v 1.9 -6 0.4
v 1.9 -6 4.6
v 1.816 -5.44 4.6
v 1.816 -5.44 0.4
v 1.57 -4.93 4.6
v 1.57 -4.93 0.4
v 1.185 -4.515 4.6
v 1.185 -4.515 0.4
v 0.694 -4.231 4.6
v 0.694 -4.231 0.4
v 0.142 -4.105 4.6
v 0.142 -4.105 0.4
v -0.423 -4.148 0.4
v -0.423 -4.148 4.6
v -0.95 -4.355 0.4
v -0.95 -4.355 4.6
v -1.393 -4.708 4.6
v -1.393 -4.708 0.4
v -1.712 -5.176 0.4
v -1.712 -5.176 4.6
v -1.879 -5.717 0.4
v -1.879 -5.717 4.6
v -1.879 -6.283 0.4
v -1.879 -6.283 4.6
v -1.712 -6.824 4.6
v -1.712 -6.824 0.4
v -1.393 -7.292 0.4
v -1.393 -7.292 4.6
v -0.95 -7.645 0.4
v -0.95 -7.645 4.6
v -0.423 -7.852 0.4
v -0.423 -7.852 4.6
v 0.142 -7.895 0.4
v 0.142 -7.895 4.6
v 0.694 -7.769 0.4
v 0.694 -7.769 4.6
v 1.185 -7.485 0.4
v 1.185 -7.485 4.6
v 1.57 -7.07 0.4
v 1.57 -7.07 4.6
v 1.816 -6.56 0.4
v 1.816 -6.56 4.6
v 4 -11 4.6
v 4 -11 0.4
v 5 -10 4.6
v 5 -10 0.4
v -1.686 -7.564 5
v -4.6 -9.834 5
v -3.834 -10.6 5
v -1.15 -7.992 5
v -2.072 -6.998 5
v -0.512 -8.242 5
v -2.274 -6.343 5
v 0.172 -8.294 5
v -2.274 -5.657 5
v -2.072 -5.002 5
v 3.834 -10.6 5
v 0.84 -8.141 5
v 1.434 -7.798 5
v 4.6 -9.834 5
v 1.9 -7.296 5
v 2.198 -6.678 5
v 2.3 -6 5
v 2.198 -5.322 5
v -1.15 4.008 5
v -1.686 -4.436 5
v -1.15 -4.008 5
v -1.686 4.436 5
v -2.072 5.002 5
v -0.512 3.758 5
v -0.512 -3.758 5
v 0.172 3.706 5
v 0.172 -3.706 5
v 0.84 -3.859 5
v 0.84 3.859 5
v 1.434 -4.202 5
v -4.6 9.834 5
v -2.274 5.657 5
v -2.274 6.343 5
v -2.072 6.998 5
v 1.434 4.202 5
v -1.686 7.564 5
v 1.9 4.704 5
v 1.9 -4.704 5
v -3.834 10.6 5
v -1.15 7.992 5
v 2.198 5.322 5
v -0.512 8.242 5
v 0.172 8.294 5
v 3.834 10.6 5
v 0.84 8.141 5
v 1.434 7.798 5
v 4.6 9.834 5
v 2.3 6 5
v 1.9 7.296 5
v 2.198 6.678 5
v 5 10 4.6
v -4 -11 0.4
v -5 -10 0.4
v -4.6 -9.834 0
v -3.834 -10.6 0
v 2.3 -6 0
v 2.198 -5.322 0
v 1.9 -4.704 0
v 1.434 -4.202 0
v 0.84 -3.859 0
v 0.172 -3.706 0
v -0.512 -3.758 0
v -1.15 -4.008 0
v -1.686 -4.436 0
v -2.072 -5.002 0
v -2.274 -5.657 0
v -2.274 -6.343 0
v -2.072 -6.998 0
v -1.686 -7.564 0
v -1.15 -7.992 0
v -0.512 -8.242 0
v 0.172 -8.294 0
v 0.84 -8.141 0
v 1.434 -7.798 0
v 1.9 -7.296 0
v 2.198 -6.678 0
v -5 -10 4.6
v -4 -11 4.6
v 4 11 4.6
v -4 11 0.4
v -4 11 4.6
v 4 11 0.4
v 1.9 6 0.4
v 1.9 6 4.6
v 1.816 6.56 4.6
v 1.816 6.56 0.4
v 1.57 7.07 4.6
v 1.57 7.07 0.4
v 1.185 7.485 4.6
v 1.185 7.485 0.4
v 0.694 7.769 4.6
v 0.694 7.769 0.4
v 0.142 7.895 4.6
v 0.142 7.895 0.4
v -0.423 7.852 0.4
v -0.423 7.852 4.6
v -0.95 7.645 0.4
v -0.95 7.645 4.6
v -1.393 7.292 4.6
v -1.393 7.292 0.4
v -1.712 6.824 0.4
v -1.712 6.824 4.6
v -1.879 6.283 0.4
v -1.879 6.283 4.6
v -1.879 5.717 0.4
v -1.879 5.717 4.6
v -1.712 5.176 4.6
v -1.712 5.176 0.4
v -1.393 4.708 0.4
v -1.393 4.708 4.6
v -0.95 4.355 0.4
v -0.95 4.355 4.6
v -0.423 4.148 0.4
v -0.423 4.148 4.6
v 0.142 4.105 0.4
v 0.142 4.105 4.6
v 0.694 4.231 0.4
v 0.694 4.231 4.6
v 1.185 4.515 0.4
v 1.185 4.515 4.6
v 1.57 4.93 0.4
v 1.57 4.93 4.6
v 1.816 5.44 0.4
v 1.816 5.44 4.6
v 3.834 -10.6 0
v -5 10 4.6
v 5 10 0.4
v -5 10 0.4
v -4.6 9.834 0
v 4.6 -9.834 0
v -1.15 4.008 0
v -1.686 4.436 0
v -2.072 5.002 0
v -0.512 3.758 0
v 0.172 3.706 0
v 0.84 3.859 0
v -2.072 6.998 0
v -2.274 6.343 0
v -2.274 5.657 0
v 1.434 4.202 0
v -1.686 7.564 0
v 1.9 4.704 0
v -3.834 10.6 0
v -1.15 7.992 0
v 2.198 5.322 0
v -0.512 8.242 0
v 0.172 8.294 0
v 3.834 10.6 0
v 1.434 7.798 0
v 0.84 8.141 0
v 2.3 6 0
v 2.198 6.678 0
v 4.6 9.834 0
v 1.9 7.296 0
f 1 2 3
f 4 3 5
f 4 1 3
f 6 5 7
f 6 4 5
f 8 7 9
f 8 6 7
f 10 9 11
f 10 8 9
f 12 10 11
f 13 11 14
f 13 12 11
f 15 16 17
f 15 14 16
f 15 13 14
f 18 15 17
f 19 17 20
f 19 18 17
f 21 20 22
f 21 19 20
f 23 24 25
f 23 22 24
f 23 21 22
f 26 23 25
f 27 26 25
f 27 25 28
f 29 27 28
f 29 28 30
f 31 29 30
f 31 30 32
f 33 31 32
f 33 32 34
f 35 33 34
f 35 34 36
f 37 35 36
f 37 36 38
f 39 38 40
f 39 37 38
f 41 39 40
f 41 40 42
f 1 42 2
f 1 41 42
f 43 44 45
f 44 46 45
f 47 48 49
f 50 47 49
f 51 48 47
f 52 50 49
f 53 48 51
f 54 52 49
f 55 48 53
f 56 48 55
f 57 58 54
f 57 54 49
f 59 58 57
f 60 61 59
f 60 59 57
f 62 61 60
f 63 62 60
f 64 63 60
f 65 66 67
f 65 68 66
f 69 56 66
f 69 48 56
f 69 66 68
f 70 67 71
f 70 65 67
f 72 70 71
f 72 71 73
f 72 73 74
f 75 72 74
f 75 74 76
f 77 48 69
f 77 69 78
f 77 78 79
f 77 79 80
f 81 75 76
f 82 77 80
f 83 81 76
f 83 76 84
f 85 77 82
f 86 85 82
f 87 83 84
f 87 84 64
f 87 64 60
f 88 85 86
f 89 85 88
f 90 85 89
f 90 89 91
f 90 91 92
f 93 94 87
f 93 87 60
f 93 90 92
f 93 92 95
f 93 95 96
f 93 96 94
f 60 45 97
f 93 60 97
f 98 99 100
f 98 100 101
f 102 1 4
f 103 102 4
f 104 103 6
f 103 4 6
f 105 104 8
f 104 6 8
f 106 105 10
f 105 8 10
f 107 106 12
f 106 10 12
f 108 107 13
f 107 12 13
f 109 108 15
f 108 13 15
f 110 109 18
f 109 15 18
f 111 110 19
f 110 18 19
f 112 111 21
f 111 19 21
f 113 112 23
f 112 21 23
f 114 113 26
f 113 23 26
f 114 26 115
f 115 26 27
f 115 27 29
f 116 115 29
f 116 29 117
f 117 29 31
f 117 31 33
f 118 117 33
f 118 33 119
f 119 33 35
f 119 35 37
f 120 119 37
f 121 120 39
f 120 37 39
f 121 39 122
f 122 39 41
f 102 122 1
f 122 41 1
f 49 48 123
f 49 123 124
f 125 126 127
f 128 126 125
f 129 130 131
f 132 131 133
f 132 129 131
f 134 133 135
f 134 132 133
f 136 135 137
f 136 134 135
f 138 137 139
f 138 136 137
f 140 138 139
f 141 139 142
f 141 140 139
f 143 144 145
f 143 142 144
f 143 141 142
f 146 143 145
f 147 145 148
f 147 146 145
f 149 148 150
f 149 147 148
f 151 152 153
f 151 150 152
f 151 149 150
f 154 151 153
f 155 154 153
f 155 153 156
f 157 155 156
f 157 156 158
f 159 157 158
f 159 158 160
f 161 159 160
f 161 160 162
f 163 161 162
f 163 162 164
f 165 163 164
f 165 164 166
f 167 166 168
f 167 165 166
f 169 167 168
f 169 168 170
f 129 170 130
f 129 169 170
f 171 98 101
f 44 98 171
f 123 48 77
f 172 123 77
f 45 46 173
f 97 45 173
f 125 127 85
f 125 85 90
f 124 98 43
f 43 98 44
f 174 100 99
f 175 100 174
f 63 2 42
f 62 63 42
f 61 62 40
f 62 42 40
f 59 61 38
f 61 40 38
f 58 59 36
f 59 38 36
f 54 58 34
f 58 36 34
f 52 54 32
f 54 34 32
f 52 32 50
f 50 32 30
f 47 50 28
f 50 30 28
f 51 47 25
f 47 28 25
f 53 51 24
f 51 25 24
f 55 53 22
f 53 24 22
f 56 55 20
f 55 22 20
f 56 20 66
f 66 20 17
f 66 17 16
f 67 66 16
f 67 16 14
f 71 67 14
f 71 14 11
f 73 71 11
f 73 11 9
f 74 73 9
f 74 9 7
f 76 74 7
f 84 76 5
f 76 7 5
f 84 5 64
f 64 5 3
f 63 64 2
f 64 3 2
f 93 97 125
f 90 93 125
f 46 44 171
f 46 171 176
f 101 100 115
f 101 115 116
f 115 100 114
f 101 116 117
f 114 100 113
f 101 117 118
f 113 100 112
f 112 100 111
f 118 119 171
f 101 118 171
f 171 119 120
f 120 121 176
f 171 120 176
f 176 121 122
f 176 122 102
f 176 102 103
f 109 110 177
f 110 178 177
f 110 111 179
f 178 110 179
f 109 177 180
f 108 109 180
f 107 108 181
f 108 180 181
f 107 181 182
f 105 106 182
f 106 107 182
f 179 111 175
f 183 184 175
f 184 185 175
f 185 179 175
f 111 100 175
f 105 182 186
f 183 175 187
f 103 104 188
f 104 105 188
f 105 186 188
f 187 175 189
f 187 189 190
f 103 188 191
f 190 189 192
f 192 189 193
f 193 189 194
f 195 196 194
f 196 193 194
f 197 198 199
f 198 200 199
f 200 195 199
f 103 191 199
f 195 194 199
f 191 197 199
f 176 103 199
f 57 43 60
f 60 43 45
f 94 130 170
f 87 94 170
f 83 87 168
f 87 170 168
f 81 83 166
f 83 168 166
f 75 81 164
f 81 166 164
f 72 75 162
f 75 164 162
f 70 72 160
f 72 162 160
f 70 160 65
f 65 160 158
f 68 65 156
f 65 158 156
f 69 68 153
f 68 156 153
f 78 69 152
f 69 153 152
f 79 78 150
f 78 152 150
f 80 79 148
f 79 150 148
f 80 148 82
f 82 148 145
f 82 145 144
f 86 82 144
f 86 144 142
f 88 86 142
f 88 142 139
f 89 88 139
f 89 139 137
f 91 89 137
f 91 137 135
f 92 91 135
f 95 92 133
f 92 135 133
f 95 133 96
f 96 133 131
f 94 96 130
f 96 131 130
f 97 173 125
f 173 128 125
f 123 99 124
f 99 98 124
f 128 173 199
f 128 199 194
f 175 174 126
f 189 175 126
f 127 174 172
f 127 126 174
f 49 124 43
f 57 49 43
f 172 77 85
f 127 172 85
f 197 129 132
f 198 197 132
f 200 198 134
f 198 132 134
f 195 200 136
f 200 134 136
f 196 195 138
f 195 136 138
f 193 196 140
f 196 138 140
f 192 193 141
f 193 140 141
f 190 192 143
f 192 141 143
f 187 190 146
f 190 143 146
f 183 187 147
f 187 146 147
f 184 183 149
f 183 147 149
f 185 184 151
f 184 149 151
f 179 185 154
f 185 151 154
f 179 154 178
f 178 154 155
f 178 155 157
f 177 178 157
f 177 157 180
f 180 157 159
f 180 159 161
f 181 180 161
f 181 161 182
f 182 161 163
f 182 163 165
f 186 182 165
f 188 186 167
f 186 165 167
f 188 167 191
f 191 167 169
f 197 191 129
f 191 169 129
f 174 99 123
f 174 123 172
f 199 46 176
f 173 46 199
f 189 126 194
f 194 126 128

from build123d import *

# Parameters (mm, degrees)
CYLINDER017_R     = 1.9
CYLINDER017_DEPTH = 10
CYLINDER016_R     = 1.9
CYLINDER016_DEPTH = 10
BOX001_W          = 10
BOX001_H          = 22
BOX001_DEPTH      = 5
CHAMFER002_SIZE   = 1
CHAMFER003_SIZE   = 0.4


with BuildPart() as cylinder017:
    # Cylinder017 → Cylinder017 (new body)
    with BuildSketch(Plane(origin=(0, -6, 0), x_dir=(1, 0, 0), z_dir=(0, 0, 1))):
        Circle(CYLINDER017_R)
    extrude(amount=CYLINDER017_DEPTH)


with BuildPart() as fusion005:
    # Cylinder016 → Cylinder016 (new body)
    with BuildSketch(Plane(origin=(0, 6, 0), x_dir=(1, 0, 0), z_dir=(0, 0, 1))):
        Circle(CYLINDER016_R)
    extrude(amount=CYLINDER016_DEPTH)

    # Fusion005: union Cylinder017
    add(cylinder017.part)


with BuildPart() as chamfer003001:
    # Box001 → Box001 (new body)
    with BuildSketch(Plane(origin=(-5, -11, 0), x_dir=(1, 0, 0), z_dir=(0, 0, 1))):
        with Locations((5, 11)):
            Rectangle(BOX001_W, BOX001_H)
    extrude(amount=BOX001_DEPTH)

    # Chamfer002
    chamfer002_edges = [chamfer003001.edges().sort_by_distance(p)[0] for p in [
        (-5, -11, 2.5),
        (-5, 11, 2.5),
        (5, -11, 2.5),
        (5, 11, 2.5),
    ]]
    chamfer(chamfer002_edges, length=CHAMFER002_SIZE)

    # Cut001004: cut Fusion005
    add(fusion005.part, mode=Mode.SUBTRACT)

    # Chamfer003
    chamfer003_edges = [chamfer003001.edges().sort_by_distance(p)[0] for p in [
        (-5, 0, 5),
        (-5, 0, 0),
        (-4.5, -10.5, 5),
        (-4.5, 10.5, 5),
        (0, -11, 5),
        (0, 11, 5),
        (4.5, -10.5, 5),
        (4.5, 10.5, 5),
        (5, 0, 5),
        (-1.9, -6, 5),
        (-1.9, 6, 5),
        (-4.5, -10.5, 0),
        (-4.5, 10.5, 0),
        (0, -11, 0),
        (0, 11, 0),
        (4.5, -10.5, 0),
        (4.5, 10.5, 0),
        (5, 0, 0),
        (-1.9, -6, 0),
        (-1.9, 6, 0),
    ]]
    chamfer(chamfer003_edges, length=CHAMFER003_SIZE)


solid = chamfer003001.part
